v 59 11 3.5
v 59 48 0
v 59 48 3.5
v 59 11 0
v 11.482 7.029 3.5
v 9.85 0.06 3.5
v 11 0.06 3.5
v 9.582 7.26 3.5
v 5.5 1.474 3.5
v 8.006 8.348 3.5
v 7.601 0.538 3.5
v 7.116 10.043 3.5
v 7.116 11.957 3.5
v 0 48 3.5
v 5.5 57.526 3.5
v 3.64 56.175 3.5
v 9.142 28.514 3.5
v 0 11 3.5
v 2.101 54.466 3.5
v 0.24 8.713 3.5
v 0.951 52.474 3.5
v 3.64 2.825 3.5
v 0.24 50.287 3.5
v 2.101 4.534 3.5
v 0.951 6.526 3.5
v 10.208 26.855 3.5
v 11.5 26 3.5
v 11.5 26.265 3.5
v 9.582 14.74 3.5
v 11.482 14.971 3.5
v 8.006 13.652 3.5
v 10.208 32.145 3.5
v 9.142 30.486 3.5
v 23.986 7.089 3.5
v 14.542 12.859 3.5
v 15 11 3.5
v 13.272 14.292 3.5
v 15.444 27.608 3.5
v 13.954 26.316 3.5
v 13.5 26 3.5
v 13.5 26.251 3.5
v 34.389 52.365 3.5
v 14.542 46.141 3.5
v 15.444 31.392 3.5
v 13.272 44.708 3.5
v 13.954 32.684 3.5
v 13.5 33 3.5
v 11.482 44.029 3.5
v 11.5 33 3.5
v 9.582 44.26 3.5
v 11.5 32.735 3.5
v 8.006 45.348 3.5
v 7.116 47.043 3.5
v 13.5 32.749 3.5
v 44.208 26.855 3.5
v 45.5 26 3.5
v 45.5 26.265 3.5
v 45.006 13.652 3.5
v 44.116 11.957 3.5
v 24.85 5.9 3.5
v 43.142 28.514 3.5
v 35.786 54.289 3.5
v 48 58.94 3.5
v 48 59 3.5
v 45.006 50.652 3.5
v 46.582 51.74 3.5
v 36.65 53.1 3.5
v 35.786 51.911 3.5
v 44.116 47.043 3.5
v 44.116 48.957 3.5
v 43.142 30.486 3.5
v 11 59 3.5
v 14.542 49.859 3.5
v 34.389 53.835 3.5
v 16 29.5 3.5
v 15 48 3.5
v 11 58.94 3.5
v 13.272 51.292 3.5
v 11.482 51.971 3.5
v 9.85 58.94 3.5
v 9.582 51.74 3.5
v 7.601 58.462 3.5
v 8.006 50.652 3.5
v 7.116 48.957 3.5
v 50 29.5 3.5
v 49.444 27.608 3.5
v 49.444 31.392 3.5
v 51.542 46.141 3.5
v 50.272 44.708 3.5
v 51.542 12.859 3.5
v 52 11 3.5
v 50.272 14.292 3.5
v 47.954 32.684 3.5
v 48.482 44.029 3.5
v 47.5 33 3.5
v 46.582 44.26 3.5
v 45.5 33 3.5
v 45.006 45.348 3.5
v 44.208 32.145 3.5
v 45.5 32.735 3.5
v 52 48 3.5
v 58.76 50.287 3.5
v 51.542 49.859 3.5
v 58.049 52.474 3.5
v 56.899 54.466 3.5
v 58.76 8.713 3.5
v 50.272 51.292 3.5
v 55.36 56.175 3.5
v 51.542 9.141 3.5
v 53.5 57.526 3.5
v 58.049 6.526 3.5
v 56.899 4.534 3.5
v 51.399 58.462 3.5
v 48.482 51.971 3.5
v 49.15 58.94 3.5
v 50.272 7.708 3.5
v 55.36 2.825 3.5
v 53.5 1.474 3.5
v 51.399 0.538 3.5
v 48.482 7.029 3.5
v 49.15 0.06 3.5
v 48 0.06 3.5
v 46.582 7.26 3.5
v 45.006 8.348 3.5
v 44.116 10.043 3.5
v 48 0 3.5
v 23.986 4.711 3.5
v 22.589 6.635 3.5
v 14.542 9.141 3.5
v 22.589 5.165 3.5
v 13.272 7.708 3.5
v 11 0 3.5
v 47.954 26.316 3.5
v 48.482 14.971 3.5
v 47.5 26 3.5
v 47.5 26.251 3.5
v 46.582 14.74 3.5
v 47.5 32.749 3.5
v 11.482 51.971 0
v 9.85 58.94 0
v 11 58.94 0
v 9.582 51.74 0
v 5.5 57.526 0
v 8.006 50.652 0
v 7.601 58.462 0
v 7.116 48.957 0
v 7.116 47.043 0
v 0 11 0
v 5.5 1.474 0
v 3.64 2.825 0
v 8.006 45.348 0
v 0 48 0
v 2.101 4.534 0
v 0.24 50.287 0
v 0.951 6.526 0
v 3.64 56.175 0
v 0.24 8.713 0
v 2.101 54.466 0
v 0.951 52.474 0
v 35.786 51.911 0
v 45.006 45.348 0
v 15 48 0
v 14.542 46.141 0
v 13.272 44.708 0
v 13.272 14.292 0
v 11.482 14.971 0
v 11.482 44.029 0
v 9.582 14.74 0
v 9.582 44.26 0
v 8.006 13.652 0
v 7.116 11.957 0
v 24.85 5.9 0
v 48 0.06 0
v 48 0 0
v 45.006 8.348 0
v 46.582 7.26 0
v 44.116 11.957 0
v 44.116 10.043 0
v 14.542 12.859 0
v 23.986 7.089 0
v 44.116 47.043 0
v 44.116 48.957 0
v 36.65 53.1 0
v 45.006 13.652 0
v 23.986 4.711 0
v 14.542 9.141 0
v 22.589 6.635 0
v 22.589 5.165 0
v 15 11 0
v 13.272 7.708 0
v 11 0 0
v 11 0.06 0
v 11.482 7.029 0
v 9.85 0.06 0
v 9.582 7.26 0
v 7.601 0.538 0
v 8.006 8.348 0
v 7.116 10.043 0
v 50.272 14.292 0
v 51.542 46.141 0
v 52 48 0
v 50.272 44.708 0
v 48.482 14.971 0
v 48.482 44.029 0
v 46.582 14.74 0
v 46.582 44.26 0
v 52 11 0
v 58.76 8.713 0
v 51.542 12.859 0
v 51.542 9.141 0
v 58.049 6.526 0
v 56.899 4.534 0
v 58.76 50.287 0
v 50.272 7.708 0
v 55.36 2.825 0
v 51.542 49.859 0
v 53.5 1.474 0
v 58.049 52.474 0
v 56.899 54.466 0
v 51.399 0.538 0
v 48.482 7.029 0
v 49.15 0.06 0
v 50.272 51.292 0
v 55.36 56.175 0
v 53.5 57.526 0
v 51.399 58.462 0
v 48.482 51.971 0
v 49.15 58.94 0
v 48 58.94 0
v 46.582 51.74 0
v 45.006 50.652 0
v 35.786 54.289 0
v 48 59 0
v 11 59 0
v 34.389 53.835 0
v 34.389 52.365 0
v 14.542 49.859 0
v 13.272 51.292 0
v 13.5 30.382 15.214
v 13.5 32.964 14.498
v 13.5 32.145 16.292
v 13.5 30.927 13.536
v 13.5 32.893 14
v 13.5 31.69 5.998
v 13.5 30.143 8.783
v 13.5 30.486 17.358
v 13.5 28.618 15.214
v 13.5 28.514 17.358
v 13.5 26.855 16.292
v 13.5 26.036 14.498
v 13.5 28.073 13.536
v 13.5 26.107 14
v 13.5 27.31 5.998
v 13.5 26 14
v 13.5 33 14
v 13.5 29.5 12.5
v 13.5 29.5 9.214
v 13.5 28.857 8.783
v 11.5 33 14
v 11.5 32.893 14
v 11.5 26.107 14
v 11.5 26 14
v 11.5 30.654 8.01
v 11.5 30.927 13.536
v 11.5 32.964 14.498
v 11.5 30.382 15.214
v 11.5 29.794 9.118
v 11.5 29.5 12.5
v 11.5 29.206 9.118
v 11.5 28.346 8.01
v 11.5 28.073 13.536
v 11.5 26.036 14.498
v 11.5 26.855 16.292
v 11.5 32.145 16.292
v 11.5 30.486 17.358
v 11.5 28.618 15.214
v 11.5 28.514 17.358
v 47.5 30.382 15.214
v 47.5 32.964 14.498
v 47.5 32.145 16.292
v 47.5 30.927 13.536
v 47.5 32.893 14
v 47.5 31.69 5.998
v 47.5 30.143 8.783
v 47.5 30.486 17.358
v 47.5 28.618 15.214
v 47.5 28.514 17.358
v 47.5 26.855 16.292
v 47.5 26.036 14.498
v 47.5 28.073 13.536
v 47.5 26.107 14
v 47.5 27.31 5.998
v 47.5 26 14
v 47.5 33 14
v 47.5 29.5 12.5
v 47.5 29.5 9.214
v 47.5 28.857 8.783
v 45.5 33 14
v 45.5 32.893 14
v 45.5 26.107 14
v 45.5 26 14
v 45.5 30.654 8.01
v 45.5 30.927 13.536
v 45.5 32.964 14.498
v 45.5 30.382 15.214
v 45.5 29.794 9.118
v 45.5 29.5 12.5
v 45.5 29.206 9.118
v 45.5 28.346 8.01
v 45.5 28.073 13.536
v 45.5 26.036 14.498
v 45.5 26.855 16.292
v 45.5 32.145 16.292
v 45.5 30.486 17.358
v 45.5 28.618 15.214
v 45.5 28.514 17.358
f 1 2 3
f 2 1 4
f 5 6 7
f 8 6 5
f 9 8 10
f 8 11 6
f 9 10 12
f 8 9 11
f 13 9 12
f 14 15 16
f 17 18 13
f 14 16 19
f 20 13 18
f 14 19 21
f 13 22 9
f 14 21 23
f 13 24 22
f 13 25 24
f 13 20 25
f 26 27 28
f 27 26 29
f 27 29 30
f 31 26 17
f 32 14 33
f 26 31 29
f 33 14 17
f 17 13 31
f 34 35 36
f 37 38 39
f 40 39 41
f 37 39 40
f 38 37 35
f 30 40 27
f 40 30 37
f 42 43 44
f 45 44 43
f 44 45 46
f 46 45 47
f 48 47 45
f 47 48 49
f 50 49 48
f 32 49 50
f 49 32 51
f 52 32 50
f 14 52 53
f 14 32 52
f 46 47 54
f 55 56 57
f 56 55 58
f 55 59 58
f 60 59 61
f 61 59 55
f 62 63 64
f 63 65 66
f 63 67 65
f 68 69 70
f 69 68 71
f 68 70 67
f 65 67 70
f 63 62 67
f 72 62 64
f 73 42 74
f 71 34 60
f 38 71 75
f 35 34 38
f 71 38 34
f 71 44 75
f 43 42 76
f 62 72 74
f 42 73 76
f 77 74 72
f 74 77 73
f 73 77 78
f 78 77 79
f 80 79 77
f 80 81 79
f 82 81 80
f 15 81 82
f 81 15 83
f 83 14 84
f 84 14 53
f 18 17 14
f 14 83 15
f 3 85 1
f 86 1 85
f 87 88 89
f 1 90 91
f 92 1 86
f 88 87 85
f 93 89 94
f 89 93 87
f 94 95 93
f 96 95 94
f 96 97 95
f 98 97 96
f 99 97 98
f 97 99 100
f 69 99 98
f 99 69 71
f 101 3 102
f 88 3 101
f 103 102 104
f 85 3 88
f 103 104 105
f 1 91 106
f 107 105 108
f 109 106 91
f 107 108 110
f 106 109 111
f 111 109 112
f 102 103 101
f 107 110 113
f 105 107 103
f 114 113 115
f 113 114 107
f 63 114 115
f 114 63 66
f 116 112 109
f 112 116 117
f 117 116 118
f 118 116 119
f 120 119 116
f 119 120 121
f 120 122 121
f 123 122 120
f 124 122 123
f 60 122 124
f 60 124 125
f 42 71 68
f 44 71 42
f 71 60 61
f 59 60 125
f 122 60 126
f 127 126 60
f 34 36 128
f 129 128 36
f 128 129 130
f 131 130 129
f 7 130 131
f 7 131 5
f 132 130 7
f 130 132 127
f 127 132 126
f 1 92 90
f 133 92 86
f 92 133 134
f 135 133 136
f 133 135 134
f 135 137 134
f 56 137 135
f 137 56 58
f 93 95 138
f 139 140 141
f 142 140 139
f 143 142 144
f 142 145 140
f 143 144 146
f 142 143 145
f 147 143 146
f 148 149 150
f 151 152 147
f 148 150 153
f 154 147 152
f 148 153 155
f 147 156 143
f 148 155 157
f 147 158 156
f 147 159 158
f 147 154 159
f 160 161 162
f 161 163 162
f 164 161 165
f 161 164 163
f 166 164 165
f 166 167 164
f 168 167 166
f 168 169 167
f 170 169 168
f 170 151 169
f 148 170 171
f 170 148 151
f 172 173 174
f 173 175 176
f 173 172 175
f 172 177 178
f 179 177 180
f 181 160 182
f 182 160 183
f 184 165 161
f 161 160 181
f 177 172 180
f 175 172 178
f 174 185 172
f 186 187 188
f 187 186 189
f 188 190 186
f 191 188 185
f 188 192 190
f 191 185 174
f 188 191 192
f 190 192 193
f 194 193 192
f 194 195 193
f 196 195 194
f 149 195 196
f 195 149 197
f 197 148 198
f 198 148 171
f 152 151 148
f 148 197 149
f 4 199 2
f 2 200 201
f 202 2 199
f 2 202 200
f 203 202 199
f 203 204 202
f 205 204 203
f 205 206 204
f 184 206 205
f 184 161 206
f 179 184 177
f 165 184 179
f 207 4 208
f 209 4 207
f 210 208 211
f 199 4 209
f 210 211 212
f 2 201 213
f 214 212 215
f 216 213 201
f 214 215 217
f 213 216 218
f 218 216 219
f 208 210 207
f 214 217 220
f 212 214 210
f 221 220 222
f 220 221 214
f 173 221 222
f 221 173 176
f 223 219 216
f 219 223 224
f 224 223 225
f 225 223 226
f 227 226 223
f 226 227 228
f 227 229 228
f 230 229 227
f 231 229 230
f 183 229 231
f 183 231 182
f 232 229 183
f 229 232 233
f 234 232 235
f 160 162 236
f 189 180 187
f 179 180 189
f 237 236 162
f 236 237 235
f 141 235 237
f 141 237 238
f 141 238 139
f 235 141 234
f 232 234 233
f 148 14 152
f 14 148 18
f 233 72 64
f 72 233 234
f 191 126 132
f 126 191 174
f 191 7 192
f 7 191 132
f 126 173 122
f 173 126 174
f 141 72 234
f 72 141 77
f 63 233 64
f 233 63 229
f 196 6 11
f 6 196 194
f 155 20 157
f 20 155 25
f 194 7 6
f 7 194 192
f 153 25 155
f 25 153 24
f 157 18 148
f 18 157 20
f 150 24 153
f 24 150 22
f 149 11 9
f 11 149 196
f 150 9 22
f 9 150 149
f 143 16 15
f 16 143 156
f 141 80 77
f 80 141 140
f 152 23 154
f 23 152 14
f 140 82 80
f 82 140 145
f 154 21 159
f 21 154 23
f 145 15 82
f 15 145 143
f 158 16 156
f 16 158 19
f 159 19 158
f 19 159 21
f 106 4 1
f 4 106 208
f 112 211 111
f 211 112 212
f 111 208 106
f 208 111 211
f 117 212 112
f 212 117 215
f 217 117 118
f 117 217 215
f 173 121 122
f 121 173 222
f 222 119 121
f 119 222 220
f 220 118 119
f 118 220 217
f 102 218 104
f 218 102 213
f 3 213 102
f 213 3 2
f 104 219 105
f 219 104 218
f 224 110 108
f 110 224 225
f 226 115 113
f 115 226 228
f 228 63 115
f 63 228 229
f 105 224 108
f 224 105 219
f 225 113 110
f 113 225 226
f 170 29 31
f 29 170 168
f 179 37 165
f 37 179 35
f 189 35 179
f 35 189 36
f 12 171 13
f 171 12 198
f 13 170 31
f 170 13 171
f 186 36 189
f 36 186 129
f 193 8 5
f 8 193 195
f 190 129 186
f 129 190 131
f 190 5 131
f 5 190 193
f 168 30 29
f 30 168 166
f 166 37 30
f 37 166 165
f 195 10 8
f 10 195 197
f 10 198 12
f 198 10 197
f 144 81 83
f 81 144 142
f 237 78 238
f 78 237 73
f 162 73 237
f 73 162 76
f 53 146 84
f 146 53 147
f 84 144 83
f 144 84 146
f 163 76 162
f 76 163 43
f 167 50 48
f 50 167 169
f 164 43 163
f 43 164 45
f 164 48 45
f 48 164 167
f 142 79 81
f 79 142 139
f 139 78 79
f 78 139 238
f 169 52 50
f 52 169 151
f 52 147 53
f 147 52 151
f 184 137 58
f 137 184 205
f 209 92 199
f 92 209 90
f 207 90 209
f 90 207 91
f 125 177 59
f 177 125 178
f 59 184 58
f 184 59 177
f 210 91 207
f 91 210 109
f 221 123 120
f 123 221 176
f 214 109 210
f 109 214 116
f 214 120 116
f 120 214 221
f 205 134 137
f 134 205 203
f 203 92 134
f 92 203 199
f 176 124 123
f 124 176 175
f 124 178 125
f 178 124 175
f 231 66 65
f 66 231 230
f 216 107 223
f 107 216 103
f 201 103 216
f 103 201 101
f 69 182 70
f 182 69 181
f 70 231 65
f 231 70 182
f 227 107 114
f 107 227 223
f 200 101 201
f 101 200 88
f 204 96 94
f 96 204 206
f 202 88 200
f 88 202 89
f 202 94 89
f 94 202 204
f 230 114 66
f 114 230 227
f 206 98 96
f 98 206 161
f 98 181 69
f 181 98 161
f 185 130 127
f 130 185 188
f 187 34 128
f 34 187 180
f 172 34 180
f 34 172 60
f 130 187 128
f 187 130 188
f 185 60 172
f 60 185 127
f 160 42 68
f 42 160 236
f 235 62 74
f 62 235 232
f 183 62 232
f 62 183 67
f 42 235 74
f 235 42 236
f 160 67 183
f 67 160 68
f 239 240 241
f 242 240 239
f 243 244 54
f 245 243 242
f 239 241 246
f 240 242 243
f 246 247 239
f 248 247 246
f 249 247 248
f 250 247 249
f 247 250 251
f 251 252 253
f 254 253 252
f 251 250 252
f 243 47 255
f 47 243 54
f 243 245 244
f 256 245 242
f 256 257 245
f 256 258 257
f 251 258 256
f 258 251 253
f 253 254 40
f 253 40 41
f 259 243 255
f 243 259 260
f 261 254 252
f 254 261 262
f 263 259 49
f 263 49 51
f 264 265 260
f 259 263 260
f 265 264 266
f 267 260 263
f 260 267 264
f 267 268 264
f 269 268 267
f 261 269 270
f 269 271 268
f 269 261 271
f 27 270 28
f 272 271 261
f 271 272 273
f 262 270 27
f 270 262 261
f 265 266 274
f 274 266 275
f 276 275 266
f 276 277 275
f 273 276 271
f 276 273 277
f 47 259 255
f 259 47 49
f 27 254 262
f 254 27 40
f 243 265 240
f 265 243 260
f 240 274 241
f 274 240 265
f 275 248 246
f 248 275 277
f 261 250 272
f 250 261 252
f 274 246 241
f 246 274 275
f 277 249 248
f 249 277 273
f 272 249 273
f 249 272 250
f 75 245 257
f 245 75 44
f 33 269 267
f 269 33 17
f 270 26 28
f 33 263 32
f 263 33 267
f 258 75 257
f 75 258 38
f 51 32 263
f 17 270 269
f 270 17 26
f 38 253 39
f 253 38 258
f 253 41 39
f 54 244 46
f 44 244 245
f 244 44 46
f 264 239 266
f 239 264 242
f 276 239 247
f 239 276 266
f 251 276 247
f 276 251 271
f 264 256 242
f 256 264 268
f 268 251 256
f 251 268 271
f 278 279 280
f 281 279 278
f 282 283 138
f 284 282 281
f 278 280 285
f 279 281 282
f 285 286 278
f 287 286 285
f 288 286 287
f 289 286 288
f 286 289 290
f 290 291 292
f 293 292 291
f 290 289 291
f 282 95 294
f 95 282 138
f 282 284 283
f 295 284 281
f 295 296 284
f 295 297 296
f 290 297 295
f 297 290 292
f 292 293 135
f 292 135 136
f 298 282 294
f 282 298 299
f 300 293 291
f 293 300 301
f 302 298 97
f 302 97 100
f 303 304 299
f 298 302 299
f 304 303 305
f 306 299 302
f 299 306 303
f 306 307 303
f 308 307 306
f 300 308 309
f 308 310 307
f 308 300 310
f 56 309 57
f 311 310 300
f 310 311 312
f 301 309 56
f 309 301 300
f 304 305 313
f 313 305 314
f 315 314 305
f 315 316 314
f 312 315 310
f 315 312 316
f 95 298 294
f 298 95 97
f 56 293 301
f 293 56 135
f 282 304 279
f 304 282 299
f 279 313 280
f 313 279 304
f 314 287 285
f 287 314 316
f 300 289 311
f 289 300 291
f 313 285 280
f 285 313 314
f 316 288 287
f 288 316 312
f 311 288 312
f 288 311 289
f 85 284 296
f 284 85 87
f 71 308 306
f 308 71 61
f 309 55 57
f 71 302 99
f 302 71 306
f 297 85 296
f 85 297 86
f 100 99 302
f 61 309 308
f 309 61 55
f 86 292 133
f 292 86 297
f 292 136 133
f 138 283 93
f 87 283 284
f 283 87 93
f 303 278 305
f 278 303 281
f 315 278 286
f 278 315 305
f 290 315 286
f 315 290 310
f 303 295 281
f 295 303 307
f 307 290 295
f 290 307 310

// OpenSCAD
// Vertical carriage
// Created for the Echidna delta 3d printer
// https://github.com/bendetat/echidna

// This is based on the bumrail rod design using:
// - 608zz bearings
// - Traxxas 5347? rod ends
// - monofilament pulley with swivel connections
// - M8 bolts through the bearings to join the plates
// - M3 bolts for connecting swivels and endstop adjusters
// It could be adapted for T-Slot by adjusting the bearing outer
// diameter and making the internalToBearing and externalToBearing
// the same

//scaleFactorX = 1.17; // for sleeves
scaleFactorX = 1;
scaleFactorY = scaleFactorX;
scaleFactorZ = 1;

rodWidth = 15;
bearingOd = 22;
bearingId = 8;
bearingDepth = 6.94;
carriageDepth = 3.5;
distanceBetweenRodEnds = 34;	// outside distance between rod ends

smallBoltDiameter = 3;	// used for the Traxxas rod ends
untappedSmallBoltDiameter = 2.5;// used for the swivel holes, the endstop adjustor
pinDiameter = 1.75;	// using 1.75mm filament as a locking pin

// Distance from the carriage to the bearing (not including the bearing itself)
internalToBearing = 14;
externalToBearing = 16;
bearingSleeveThickness = 0.5;

carriageSize = rodWidth + bearingOd * 2;
smallBoltRadius = smallBoltDiameter / 2;
untappedSmallBoltRadius = untappedSmallBoltDiameter / 2;

scale([scaleFactorX,scaleFactorY,scaleFactorZ]) {
	internalCarriage();
	//externalCarriage();
	//bearingShaft();
	//bearingShaftSleeve();
	//bearingShaftSleeveInternal();
	//assembled();
	//rodEndJoint();
}

module assembled() {
	// one external carriage, one internal carriage, four bearing shafts
	// and four bearing shaft sleeves
	translate([0,0,carriageDepth+internalToBearing+bearingDepth+externalToBearing]) {
		rotate() {
			externalCarriage();
		}
	}
	translate([0,carriageSize,carriageDepth]) {
		rotate([180,0,0]) {
			internalCarriage();
		}
	}
	translate([bearingOd/2,bearingOd/2,0]) {
		assembledBearingShaft();
	}
	translate([carriageSize-bearingOd/2,bearingOd/2,0]) {
		assembledBearingShaft();
	}
	translate([bearingOd/2,carriageSize-bearingOd/2,0]) {
		assembledBearingShaft();
	}
	translate([carriageSize-bearingOd/2,carriageSize-bearingOd/2,0]) {
		assembledBearingShaft();
	}
}

module assembledBearingShaft() {
	bearingShaft();
	translate([0,0,carriageDepth+internalToBearing+bearingDepth]) {
		bearingShaftSleeve();
	}
}

module bearingShaft() {
	difference() {
		union() {
			cylinder(r=bearingId/2, h=internalToBearing+externalToBearing+bearingDepth+carriageDepth*2);
			translate([0,0,carriageDepth]) {
				cylinder(r=bearingId/2+bearingSleeveThickness, h=internalToBearing);
			}
		}
		// pin
		translate([0,(bearingId+2)/2,carriageDepth+internalToBearing+bearingDepth+(pinDiameter/2)]) {
			rotate([90,0,0]) {
				cylinder(r=pinDiameter/2, h=bearingId+2);
			}
		}
	}
}

module bearingShaftSleeve() {
	difference() {
		cylinder(r=bearingId/2+bearingSleeveThickness, h=externalToBearing);
		translate([0,0,-1]) {			
			cylinder(r=bearingId/2, h=externalToBearing+2);
		}
	}
}
module bearingShaftSleeveInternal() {
	difference() {
		cylinder(r=bearingId/2+bearingSleeveThickness, h=internalToBearing);
		translate([0,0,-1]) {			
			cylinder(r=bearingId/2, h=internalToBearing+2);
		}
	}
}

module externalCarriage() {
	adjustorHeight = 8;
	adjustorLength = 15;
	difference() {
		union() {
			basicCarriage();
			translate([carriageSize/2-adjustorHeight/2,0,carriageDepth]) {
				cube([adjustorHeight,adjustorLength,adjustorHeight]);
			}
			translate([carriageSize/2,adjustorLength,carriageDepth + adjustorHeight]){
				rotate([90,0,0]) {
					cylinder(r=adjustorHeight/2,h=adjustorLength);
				}
			}
		}
		translate([carriageSize/2,adjustorLength +1,carriageDepth + adjustorHeight]) {
			rotate([90,0,0]) {
				cylinder(r=untappedSmallBoltRadius,h=adjustorLength+2);
			}
		}
	}
}

module internalCarriage() {
	difference() {
		basicCarriage();
		// drill holes for pulley swivels		
		translate([carriageSize * 0.4, carriageSize / 10,-1]) {
			cylinder(r=untappedSmallBoltRadius, h=carriageDepth + 2);
		}
		translate([carriageSize * 0.6, 9 * carriageSize / 10,-1]) {
			cylinder(r=untappedSmallBoltRadius, h=carriageDepth + 2);
		}
	}
	translate([carriageSize/2-distanceBetweenRodEnds/2-1,carriageSize/2-7/2,carriageDepth]) {
		rodEndJoint();
	}
	translate([carriageSize/2+distanceBetweenRodEnds/2-1,carriageSize/2-7/2,carriageDepth]) {
		rodEndJoint();
	}
}

module basicCarriage() {
	difference() {
		// carriage with rounded corners
		union() {
			// carriage with corners cut out
			difference() {
				cube([carriageSize, carriageSize, carriageDepth]);
				translate([-1,-1,-1]) {
					cube([bearingOd/2 + 1, bearingOd/2 + 1, carriageDepth + 2]);
				}
				translate([carriageSize - bearingOd / 2,-1,-1]) {
					cube([bearingOd/2 + 1, bearingOd/2 + 1, carriageDepth + 2]);
				}
				translate([-1,carriageSize - bearingOd / 2,-1]) {
					cube([bearingOd/2 + 1, bearingOd/2 + 1, carriageDepth + 2]);
				}
				translate([carriageSize - bearingOd / 2,carriageSize - bearingOd / 2,-	1]) 	{
					cube([bearingOd/2 + 1, bearingOd/2 + 1, carriageDepth + 2]);
				}
			}
			//corners
			translate([bearingOd / 2,bearingOd / 2, 0]) {
				cylinder(r=bearingOd/2,h=carriageDepth);
			}
			translate([bearingOd / 2,bearingOd / 2 + carriageSize - bearingOd, 0]) {
				cylinder(r=bearingOd/2,h=carriageDepth);
			}
			translate([bearingOd / 2 + carriageSize - bearingOd, bearingOd / 2, 0]) {
				cylinder(r=bearingOd/2,h=carriageDepth);
			}
			translate([bearingOd / 2 + carriageSize - bearingOd, bearingOd / 2 + carriageSize - bearingOd, 0]) {
				cylinder(r=bearingOd/2,h=carriageDepth);
			}
		}

		// cut-outs for bolts
		translate([bearingOd / 2, bearingOd / 2, -1]) {
			cylinder(r=bearingId/2,h=carriageDepth + 2);
		}
		translate([bearingOd / 2,bearingOd / 2 + carriageSize - bearingOd, -1]) {
			cylinder(r=bearingId/2,h=carriageDepth + 2);
		}
		translate([bearingOd / 2 + carriageSize - bearingOd, bearingOd / 2, -1]) {
			cylinder(r=bearingId/2,h=carriageDepth + 2);
		}
		translate([bearingOd / 2 + carriageSize - bearingOd, bearingOd / 2 + carriageSize - bearingOd, -1]) {
			cylinder(r=bearingId/2,h=carriageDepth + 2);
		}
	}
}

module rodEndJoint() {
	jointThickness = 2;
	difference() {
		union() {
			cube([jointThickness,7,7+7/2]);
			translate([0,7/2,7+7/2]) {
				rotate([0,90,0]) {
					cylinder(r=3.5,h=jointThickness);
				}
			}
			// bulk up the sides for strength
			translate([jointThickness/2,7/2,0]) cylinder(r1=7/2,r2=0,h=8);
		}
		translate([-1,7/2,7+7/2]) {
			rotate([0,90,0]) {
				cylinder(r=smallBoltRadius, h=jointThickness + 2);
			}
		}
	}
}
